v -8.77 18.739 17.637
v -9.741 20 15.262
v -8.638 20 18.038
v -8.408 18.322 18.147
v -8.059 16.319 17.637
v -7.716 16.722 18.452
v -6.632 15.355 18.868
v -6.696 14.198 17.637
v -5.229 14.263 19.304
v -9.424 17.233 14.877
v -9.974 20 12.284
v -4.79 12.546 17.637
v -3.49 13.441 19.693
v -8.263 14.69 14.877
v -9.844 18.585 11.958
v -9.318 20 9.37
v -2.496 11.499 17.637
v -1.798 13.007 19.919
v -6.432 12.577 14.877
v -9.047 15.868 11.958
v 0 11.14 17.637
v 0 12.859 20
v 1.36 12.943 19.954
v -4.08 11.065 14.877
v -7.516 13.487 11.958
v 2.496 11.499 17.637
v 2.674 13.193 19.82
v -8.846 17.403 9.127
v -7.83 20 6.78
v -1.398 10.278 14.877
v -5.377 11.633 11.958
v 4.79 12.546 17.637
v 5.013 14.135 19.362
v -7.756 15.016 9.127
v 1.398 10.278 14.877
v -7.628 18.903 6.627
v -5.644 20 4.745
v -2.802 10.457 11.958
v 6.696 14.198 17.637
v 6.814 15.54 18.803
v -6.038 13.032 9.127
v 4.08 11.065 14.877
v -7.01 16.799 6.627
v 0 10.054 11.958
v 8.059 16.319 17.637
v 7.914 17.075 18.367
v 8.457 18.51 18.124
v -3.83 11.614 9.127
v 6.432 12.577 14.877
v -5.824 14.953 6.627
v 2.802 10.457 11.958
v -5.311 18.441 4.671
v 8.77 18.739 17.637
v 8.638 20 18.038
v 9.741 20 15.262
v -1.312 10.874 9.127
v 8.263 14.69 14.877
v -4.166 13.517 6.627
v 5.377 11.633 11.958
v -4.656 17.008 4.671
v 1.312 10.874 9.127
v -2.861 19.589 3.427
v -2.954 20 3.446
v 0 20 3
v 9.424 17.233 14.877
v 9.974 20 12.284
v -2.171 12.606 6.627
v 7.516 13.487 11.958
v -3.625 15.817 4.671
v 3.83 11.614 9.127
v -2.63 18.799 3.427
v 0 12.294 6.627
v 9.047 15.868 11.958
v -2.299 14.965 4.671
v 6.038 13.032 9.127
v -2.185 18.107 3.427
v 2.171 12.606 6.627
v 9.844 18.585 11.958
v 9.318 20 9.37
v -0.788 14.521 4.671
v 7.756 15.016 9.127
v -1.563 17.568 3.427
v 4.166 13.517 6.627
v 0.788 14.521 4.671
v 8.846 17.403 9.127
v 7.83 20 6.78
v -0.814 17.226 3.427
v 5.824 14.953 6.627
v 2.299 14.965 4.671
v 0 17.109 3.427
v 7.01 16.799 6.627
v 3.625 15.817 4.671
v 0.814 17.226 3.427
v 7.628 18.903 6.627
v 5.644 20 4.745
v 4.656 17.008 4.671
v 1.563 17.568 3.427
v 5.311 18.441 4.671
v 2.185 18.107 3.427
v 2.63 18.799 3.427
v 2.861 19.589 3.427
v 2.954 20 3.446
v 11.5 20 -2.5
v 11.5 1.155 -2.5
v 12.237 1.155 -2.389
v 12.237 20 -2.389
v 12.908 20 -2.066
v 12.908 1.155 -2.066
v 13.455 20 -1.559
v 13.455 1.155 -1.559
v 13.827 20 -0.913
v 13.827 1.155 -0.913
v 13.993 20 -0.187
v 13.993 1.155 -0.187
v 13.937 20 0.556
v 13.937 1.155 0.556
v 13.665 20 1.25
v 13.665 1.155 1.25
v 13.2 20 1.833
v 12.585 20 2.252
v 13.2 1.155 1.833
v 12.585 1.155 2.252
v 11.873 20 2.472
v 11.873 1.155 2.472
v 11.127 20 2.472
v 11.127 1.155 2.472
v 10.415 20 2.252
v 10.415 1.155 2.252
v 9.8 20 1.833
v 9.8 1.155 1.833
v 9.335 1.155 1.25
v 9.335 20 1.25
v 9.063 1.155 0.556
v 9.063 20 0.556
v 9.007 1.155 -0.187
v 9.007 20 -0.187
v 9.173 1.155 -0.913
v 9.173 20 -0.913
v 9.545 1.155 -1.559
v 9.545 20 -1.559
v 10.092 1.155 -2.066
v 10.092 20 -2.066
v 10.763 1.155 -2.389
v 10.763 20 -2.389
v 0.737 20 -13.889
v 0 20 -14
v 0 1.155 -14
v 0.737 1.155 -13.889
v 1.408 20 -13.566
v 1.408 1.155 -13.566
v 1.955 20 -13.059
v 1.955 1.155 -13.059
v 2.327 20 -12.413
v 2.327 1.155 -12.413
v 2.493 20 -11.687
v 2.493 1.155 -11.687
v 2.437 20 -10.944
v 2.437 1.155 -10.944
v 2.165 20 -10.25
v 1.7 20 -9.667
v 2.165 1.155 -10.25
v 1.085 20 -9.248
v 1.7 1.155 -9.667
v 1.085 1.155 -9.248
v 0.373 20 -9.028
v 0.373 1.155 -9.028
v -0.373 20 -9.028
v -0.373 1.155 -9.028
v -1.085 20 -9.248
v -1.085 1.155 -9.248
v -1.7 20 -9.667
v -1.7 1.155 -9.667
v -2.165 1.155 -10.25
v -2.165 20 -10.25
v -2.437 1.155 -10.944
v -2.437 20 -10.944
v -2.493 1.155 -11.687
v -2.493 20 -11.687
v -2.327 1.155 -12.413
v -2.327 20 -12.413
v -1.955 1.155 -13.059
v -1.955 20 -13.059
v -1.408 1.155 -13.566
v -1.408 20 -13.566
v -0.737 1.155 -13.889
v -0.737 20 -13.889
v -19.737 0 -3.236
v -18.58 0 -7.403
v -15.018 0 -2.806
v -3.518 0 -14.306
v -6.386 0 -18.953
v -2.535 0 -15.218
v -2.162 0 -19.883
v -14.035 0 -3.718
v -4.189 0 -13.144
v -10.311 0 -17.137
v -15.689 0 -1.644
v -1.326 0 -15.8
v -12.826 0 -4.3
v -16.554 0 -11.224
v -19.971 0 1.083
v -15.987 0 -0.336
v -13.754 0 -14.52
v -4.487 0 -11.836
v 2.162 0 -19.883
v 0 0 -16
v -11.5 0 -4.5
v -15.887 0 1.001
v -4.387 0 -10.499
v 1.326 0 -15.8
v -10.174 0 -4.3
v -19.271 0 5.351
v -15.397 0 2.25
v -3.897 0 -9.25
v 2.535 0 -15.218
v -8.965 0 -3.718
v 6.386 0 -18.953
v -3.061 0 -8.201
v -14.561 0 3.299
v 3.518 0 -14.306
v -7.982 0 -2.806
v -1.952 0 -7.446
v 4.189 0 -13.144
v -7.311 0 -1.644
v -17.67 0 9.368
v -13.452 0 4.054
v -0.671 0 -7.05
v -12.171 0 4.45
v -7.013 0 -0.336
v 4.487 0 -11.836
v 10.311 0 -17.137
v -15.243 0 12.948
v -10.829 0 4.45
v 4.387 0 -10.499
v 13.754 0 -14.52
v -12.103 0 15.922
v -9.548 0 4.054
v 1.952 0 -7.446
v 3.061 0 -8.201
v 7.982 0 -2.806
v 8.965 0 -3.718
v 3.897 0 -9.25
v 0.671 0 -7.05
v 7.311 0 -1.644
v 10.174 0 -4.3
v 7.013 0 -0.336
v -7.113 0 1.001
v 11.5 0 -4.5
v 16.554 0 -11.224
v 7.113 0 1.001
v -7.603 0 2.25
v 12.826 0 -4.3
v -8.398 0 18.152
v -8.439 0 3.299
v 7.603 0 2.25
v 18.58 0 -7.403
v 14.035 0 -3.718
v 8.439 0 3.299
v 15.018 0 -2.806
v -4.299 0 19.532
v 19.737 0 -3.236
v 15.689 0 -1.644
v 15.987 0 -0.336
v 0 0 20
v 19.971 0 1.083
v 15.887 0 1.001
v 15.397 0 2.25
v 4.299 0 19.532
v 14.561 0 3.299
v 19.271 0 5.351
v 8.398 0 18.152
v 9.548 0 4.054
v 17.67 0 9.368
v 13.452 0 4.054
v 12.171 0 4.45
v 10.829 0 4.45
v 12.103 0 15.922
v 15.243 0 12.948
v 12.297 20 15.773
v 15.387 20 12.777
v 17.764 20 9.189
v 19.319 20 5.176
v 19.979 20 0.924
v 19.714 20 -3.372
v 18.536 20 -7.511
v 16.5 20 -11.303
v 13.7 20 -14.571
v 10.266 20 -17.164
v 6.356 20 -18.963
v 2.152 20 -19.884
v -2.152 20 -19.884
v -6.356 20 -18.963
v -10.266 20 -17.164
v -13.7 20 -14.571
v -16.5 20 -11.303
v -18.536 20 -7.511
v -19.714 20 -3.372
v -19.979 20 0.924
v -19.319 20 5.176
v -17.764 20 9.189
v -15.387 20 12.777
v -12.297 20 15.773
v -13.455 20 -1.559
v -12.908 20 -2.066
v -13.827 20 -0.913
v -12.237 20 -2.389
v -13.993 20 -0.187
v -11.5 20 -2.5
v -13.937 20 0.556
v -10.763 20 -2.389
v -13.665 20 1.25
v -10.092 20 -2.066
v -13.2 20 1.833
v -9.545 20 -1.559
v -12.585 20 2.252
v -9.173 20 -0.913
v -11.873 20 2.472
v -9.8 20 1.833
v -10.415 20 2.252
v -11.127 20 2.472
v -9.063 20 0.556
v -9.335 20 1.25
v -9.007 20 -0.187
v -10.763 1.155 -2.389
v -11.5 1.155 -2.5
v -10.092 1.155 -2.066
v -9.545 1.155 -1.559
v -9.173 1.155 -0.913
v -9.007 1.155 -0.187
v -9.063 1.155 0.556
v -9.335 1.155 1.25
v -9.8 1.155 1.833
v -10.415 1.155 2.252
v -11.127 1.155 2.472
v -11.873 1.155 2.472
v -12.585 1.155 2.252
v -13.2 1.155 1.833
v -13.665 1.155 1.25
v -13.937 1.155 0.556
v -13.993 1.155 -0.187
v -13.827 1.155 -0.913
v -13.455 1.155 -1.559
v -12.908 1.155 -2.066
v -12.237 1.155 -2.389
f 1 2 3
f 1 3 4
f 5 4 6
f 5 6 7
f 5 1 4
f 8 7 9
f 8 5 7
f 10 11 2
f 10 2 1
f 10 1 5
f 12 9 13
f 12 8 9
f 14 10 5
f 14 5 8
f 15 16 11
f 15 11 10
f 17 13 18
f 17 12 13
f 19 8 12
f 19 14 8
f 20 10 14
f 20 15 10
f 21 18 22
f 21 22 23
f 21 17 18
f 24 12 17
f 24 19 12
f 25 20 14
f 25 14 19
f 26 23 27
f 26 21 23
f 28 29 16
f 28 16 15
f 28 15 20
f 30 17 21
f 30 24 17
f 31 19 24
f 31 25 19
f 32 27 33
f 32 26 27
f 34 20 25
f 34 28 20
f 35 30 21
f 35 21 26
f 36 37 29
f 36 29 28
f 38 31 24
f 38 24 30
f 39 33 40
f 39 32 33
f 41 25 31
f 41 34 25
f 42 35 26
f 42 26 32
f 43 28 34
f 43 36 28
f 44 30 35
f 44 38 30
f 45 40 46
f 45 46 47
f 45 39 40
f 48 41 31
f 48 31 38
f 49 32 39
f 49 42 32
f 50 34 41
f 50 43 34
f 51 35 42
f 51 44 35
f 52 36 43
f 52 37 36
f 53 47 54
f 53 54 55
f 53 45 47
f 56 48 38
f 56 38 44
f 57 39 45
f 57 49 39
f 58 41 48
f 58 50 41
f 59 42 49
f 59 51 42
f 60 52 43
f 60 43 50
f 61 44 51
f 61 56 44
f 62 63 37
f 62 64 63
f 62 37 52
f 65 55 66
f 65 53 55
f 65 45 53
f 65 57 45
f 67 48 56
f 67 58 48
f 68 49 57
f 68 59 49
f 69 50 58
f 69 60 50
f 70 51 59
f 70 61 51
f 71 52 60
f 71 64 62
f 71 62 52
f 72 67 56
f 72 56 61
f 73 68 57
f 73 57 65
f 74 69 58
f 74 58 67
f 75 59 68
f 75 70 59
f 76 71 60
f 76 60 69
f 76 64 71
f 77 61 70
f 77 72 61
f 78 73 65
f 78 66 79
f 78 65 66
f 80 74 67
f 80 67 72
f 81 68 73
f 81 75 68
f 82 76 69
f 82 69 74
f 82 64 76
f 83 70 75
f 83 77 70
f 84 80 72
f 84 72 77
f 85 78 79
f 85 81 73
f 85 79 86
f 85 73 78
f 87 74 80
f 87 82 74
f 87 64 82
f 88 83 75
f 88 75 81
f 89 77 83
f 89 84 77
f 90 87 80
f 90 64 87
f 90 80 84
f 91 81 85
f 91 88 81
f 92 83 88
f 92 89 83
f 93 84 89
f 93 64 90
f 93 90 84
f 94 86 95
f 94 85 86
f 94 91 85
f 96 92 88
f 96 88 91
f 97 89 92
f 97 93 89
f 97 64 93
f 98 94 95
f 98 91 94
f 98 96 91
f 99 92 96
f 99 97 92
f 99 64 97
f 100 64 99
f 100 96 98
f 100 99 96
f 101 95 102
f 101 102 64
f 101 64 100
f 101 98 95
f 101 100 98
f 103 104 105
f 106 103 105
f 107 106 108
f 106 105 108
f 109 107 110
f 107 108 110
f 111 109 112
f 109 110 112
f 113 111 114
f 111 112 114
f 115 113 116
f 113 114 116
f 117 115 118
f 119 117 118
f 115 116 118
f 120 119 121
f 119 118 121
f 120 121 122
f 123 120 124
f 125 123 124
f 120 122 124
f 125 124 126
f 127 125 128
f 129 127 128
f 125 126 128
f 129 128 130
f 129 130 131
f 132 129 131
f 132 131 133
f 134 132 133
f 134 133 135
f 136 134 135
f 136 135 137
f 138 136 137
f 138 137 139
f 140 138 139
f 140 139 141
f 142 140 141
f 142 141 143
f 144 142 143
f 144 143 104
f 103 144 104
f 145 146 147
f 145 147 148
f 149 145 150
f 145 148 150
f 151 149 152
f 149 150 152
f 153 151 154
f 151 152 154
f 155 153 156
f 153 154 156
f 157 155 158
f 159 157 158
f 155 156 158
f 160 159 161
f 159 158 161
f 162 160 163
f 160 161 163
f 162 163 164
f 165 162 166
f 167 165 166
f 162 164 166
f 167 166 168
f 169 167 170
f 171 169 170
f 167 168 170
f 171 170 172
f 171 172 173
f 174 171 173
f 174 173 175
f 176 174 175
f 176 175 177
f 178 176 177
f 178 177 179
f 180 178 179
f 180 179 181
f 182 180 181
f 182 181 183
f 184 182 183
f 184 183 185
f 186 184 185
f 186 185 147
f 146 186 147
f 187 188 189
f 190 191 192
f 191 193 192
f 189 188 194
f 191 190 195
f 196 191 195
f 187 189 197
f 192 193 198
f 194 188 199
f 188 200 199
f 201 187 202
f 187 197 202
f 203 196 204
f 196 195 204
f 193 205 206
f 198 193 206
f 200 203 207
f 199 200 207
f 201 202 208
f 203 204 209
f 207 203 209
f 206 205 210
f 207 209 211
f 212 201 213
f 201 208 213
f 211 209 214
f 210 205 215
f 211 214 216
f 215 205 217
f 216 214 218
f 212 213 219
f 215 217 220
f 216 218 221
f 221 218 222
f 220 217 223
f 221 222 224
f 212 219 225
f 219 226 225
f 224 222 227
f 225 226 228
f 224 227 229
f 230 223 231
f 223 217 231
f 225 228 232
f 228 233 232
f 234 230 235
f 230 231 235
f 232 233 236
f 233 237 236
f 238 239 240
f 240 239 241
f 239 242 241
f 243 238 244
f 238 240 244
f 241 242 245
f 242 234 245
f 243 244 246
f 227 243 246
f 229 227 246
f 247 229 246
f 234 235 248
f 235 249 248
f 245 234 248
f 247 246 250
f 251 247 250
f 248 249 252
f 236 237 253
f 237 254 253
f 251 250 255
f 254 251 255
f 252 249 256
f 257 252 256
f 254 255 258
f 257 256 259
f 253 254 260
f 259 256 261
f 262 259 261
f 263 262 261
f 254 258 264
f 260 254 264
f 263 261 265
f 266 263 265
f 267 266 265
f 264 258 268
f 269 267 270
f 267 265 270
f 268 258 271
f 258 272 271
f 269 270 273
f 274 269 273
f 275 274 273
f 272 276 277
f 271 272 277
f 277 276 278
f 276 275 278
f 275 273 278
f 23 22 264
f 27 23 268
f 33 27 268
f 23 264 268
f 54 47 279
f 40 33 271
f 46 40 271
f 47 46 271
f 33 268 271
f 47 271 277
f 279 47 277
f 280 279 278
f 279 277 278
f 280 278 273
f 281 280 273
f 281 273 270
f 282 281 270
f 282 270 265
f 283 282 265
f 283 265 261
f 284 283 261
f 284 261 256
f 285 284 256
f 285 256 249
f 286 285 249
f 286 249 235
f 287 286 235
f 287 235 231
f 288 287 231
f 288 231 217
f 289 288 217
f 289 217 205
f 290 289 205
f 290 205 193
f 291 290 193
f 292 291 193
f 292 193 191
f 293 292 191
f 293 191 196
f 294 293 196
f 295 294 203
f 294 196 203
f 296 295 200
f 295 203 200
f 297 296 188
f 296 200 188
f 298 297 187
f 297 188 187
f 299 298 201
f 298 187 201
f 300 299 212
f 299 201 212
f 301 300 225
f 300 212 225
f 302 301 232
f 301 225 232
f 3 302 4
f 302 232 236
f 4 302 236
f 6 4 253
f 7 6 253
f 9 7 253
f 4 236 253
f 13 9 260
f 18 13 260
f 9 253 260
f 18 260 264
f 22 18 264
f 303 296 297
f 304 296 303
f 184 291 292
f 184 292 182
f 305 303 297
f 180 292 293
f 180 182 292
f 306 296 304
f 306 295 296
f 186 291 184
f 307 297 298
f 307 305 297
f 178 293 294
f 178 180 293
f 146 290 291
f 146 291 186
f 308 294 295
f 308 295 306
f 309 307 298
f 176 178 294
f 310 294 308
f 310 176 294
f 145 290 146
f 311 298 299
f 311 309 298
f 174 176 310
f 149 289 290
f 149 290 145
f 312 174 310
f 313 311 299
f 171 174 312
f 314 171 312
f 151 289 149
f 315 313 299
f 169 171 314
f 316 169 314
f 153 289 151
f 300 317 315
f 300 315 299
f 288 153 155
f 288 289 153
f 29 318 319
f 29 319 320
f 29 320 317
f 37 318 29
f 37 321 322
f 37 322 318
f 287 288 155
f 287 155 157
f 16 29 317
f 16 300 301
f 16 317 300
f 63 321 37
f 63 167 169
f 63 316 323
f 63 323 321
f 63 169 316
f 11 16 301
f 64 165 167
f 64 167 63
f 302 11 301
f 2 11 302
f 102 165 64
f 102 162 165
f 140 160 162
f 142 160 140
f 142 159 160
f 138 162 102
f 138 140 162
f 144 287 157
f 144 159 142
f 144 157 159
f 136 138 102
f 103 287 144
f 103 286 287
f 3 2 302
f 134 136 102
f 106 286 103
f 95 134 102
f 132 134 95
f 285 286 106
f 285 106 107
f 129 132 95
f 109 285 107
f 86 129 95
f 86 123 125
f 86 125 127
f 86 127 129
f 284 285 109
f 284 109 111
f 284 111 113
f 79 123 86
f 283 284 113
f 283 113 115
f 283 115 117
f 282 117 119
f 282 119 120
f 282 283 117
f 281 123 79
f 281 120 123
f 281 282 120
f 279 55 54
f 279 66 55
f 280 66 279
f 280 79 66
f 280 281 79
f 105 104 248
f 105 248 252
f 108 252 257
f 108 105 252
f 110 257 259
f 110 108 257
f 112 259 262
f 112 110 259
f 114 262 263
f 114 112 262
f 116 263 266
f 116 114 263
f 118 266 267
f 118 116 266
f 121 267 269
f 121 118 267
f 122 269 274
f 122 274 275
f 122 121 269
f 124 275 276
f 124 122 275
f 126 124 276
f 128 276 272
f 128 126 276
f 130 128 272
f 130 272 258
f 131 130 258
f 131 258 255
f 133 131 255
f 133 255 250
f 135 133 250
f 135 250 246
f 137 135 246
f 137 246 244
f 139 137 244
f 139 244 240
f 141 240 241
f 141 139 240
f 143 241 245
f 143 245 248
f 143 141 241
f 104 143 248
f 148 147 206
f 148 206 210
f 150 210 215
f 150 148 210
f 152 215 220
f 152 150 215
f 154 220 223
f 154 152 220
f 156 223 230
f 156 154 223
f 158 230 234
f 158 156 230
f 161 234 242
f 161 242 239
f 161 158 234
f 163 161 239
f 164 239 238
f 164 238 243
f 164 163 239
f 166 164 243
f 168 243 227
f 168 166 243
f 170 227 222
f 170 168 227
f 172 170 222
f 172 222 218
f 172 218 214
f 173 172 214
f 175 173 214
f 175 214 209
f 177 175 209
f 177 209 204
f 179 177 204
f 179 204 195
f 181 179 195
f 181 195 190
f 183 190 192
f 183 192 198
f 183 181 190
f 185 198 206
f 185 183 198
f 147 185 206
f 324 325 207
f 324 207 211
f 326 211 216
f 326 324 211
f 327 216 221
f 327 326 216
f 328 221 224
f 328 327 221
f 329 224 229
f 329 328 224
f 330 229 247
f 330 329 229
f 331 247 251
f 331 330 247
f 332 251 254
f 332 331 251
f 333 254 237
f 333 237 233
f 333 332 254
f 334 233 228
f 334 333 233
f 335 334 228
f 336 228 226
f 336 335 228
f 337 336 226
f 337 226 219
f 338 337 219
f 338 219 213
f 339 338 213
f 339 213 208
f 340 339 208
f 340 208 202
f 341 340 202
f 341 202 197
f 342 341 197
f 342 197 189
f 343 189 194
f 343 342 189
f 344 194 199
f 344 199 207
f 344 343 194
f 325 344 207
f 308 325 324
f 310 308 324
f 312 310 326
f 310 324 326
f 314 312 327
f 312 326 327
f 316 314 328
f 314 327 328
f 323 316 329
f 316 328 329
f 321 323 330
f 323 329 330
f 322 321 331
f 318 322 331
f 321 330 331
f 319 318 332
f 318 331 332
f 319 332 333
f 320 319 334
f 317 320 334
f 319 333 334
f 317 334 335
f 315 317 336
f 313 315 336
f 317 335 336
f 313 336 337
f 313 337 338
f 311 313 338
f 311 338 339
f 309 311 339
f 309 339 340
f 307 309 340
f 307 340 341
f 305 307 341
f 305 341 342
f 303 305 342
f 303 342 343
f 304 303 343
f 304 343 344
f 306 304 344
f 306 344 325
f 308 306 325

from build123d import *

# Parameters (mm, degrees)
SKETCH_1_R          = 20
EXTRUDE_1_DEPTH     = 20
SKETCH_4_R          = 2.5
CUT_EXTRUDE_1_DEPTH = 35.641016325
CHAMFER_1_SIZE      = 2
CHAMFER_1_SIZE2     = 1.154700538


with BuildPart() as part:
    # 草图1 → 凸台-拉伸1 (new body)
    with BuildSketch(Plane(origin=(0, 0, 0), x_dir=(1, 0, 0), z_dir=(0, 1, 0))):
        with Locations(Location((0, 0, 0), (0, 0, 270))):
            Circle(SKETCH_1_R)
    extrude(amount=EXTRUDE_1_DEPTH)

    # 草图2 → 切除-旋转1 (revolve, cut)
    with BuildSketch(Plane(origin=(0, 20, 0), x_dir=(1, 0, 0), z_dir=(0, 1, 0))):
        with BuildLine():
            Line((0, -3), (0, -23))
            ThreePointArc((0, -23), (-10, -13), (0, -3))
        make_face()
    revolve(axis=Axis((0, 20, 3), (0, 0, 1)), mode=Mode.SUBTRACT)

    # 草图4 → 切除-拉伸1 (cut, through all)
    with BuildSketch(Plane.XZ):
        with Locations(Location((0, -11.5, 0), (0, 0, 270))):
            Circle(SKETCH_4_R)
        with Locations(Location((11.5, 0, 0), (0, 0, 270))):
            Circle(SKETCH_4_R)
        with Locations(Location((-11.5, 0, 0), (0, 0, 270))):
            Circle(SKETCH_4_R)
    extrude(amount=-CUT_EXTRUDE_1_DEPTH, mode=Mode.SUBTRACT)

    # 倒角1
    chamfer_1_edges = [part.edges().sort_by_distance(p)[0] for p in [
        (0, 0, -9),
        (11.5, 0, 2.5),
        (-11.5, 0, 2.5),
    ]]
    chamfer_1_side = [part.faces().sort_by_distance(p)[0] for p in [
        (0, 0, 0.18852459),
    ]]
    chamfer(chamfer_1_edges, length=CHAMFER_1_SIZE, length2=CHAMFER_1_SIZE2, reference=chamfer_1_side[0])


solid = part.part
